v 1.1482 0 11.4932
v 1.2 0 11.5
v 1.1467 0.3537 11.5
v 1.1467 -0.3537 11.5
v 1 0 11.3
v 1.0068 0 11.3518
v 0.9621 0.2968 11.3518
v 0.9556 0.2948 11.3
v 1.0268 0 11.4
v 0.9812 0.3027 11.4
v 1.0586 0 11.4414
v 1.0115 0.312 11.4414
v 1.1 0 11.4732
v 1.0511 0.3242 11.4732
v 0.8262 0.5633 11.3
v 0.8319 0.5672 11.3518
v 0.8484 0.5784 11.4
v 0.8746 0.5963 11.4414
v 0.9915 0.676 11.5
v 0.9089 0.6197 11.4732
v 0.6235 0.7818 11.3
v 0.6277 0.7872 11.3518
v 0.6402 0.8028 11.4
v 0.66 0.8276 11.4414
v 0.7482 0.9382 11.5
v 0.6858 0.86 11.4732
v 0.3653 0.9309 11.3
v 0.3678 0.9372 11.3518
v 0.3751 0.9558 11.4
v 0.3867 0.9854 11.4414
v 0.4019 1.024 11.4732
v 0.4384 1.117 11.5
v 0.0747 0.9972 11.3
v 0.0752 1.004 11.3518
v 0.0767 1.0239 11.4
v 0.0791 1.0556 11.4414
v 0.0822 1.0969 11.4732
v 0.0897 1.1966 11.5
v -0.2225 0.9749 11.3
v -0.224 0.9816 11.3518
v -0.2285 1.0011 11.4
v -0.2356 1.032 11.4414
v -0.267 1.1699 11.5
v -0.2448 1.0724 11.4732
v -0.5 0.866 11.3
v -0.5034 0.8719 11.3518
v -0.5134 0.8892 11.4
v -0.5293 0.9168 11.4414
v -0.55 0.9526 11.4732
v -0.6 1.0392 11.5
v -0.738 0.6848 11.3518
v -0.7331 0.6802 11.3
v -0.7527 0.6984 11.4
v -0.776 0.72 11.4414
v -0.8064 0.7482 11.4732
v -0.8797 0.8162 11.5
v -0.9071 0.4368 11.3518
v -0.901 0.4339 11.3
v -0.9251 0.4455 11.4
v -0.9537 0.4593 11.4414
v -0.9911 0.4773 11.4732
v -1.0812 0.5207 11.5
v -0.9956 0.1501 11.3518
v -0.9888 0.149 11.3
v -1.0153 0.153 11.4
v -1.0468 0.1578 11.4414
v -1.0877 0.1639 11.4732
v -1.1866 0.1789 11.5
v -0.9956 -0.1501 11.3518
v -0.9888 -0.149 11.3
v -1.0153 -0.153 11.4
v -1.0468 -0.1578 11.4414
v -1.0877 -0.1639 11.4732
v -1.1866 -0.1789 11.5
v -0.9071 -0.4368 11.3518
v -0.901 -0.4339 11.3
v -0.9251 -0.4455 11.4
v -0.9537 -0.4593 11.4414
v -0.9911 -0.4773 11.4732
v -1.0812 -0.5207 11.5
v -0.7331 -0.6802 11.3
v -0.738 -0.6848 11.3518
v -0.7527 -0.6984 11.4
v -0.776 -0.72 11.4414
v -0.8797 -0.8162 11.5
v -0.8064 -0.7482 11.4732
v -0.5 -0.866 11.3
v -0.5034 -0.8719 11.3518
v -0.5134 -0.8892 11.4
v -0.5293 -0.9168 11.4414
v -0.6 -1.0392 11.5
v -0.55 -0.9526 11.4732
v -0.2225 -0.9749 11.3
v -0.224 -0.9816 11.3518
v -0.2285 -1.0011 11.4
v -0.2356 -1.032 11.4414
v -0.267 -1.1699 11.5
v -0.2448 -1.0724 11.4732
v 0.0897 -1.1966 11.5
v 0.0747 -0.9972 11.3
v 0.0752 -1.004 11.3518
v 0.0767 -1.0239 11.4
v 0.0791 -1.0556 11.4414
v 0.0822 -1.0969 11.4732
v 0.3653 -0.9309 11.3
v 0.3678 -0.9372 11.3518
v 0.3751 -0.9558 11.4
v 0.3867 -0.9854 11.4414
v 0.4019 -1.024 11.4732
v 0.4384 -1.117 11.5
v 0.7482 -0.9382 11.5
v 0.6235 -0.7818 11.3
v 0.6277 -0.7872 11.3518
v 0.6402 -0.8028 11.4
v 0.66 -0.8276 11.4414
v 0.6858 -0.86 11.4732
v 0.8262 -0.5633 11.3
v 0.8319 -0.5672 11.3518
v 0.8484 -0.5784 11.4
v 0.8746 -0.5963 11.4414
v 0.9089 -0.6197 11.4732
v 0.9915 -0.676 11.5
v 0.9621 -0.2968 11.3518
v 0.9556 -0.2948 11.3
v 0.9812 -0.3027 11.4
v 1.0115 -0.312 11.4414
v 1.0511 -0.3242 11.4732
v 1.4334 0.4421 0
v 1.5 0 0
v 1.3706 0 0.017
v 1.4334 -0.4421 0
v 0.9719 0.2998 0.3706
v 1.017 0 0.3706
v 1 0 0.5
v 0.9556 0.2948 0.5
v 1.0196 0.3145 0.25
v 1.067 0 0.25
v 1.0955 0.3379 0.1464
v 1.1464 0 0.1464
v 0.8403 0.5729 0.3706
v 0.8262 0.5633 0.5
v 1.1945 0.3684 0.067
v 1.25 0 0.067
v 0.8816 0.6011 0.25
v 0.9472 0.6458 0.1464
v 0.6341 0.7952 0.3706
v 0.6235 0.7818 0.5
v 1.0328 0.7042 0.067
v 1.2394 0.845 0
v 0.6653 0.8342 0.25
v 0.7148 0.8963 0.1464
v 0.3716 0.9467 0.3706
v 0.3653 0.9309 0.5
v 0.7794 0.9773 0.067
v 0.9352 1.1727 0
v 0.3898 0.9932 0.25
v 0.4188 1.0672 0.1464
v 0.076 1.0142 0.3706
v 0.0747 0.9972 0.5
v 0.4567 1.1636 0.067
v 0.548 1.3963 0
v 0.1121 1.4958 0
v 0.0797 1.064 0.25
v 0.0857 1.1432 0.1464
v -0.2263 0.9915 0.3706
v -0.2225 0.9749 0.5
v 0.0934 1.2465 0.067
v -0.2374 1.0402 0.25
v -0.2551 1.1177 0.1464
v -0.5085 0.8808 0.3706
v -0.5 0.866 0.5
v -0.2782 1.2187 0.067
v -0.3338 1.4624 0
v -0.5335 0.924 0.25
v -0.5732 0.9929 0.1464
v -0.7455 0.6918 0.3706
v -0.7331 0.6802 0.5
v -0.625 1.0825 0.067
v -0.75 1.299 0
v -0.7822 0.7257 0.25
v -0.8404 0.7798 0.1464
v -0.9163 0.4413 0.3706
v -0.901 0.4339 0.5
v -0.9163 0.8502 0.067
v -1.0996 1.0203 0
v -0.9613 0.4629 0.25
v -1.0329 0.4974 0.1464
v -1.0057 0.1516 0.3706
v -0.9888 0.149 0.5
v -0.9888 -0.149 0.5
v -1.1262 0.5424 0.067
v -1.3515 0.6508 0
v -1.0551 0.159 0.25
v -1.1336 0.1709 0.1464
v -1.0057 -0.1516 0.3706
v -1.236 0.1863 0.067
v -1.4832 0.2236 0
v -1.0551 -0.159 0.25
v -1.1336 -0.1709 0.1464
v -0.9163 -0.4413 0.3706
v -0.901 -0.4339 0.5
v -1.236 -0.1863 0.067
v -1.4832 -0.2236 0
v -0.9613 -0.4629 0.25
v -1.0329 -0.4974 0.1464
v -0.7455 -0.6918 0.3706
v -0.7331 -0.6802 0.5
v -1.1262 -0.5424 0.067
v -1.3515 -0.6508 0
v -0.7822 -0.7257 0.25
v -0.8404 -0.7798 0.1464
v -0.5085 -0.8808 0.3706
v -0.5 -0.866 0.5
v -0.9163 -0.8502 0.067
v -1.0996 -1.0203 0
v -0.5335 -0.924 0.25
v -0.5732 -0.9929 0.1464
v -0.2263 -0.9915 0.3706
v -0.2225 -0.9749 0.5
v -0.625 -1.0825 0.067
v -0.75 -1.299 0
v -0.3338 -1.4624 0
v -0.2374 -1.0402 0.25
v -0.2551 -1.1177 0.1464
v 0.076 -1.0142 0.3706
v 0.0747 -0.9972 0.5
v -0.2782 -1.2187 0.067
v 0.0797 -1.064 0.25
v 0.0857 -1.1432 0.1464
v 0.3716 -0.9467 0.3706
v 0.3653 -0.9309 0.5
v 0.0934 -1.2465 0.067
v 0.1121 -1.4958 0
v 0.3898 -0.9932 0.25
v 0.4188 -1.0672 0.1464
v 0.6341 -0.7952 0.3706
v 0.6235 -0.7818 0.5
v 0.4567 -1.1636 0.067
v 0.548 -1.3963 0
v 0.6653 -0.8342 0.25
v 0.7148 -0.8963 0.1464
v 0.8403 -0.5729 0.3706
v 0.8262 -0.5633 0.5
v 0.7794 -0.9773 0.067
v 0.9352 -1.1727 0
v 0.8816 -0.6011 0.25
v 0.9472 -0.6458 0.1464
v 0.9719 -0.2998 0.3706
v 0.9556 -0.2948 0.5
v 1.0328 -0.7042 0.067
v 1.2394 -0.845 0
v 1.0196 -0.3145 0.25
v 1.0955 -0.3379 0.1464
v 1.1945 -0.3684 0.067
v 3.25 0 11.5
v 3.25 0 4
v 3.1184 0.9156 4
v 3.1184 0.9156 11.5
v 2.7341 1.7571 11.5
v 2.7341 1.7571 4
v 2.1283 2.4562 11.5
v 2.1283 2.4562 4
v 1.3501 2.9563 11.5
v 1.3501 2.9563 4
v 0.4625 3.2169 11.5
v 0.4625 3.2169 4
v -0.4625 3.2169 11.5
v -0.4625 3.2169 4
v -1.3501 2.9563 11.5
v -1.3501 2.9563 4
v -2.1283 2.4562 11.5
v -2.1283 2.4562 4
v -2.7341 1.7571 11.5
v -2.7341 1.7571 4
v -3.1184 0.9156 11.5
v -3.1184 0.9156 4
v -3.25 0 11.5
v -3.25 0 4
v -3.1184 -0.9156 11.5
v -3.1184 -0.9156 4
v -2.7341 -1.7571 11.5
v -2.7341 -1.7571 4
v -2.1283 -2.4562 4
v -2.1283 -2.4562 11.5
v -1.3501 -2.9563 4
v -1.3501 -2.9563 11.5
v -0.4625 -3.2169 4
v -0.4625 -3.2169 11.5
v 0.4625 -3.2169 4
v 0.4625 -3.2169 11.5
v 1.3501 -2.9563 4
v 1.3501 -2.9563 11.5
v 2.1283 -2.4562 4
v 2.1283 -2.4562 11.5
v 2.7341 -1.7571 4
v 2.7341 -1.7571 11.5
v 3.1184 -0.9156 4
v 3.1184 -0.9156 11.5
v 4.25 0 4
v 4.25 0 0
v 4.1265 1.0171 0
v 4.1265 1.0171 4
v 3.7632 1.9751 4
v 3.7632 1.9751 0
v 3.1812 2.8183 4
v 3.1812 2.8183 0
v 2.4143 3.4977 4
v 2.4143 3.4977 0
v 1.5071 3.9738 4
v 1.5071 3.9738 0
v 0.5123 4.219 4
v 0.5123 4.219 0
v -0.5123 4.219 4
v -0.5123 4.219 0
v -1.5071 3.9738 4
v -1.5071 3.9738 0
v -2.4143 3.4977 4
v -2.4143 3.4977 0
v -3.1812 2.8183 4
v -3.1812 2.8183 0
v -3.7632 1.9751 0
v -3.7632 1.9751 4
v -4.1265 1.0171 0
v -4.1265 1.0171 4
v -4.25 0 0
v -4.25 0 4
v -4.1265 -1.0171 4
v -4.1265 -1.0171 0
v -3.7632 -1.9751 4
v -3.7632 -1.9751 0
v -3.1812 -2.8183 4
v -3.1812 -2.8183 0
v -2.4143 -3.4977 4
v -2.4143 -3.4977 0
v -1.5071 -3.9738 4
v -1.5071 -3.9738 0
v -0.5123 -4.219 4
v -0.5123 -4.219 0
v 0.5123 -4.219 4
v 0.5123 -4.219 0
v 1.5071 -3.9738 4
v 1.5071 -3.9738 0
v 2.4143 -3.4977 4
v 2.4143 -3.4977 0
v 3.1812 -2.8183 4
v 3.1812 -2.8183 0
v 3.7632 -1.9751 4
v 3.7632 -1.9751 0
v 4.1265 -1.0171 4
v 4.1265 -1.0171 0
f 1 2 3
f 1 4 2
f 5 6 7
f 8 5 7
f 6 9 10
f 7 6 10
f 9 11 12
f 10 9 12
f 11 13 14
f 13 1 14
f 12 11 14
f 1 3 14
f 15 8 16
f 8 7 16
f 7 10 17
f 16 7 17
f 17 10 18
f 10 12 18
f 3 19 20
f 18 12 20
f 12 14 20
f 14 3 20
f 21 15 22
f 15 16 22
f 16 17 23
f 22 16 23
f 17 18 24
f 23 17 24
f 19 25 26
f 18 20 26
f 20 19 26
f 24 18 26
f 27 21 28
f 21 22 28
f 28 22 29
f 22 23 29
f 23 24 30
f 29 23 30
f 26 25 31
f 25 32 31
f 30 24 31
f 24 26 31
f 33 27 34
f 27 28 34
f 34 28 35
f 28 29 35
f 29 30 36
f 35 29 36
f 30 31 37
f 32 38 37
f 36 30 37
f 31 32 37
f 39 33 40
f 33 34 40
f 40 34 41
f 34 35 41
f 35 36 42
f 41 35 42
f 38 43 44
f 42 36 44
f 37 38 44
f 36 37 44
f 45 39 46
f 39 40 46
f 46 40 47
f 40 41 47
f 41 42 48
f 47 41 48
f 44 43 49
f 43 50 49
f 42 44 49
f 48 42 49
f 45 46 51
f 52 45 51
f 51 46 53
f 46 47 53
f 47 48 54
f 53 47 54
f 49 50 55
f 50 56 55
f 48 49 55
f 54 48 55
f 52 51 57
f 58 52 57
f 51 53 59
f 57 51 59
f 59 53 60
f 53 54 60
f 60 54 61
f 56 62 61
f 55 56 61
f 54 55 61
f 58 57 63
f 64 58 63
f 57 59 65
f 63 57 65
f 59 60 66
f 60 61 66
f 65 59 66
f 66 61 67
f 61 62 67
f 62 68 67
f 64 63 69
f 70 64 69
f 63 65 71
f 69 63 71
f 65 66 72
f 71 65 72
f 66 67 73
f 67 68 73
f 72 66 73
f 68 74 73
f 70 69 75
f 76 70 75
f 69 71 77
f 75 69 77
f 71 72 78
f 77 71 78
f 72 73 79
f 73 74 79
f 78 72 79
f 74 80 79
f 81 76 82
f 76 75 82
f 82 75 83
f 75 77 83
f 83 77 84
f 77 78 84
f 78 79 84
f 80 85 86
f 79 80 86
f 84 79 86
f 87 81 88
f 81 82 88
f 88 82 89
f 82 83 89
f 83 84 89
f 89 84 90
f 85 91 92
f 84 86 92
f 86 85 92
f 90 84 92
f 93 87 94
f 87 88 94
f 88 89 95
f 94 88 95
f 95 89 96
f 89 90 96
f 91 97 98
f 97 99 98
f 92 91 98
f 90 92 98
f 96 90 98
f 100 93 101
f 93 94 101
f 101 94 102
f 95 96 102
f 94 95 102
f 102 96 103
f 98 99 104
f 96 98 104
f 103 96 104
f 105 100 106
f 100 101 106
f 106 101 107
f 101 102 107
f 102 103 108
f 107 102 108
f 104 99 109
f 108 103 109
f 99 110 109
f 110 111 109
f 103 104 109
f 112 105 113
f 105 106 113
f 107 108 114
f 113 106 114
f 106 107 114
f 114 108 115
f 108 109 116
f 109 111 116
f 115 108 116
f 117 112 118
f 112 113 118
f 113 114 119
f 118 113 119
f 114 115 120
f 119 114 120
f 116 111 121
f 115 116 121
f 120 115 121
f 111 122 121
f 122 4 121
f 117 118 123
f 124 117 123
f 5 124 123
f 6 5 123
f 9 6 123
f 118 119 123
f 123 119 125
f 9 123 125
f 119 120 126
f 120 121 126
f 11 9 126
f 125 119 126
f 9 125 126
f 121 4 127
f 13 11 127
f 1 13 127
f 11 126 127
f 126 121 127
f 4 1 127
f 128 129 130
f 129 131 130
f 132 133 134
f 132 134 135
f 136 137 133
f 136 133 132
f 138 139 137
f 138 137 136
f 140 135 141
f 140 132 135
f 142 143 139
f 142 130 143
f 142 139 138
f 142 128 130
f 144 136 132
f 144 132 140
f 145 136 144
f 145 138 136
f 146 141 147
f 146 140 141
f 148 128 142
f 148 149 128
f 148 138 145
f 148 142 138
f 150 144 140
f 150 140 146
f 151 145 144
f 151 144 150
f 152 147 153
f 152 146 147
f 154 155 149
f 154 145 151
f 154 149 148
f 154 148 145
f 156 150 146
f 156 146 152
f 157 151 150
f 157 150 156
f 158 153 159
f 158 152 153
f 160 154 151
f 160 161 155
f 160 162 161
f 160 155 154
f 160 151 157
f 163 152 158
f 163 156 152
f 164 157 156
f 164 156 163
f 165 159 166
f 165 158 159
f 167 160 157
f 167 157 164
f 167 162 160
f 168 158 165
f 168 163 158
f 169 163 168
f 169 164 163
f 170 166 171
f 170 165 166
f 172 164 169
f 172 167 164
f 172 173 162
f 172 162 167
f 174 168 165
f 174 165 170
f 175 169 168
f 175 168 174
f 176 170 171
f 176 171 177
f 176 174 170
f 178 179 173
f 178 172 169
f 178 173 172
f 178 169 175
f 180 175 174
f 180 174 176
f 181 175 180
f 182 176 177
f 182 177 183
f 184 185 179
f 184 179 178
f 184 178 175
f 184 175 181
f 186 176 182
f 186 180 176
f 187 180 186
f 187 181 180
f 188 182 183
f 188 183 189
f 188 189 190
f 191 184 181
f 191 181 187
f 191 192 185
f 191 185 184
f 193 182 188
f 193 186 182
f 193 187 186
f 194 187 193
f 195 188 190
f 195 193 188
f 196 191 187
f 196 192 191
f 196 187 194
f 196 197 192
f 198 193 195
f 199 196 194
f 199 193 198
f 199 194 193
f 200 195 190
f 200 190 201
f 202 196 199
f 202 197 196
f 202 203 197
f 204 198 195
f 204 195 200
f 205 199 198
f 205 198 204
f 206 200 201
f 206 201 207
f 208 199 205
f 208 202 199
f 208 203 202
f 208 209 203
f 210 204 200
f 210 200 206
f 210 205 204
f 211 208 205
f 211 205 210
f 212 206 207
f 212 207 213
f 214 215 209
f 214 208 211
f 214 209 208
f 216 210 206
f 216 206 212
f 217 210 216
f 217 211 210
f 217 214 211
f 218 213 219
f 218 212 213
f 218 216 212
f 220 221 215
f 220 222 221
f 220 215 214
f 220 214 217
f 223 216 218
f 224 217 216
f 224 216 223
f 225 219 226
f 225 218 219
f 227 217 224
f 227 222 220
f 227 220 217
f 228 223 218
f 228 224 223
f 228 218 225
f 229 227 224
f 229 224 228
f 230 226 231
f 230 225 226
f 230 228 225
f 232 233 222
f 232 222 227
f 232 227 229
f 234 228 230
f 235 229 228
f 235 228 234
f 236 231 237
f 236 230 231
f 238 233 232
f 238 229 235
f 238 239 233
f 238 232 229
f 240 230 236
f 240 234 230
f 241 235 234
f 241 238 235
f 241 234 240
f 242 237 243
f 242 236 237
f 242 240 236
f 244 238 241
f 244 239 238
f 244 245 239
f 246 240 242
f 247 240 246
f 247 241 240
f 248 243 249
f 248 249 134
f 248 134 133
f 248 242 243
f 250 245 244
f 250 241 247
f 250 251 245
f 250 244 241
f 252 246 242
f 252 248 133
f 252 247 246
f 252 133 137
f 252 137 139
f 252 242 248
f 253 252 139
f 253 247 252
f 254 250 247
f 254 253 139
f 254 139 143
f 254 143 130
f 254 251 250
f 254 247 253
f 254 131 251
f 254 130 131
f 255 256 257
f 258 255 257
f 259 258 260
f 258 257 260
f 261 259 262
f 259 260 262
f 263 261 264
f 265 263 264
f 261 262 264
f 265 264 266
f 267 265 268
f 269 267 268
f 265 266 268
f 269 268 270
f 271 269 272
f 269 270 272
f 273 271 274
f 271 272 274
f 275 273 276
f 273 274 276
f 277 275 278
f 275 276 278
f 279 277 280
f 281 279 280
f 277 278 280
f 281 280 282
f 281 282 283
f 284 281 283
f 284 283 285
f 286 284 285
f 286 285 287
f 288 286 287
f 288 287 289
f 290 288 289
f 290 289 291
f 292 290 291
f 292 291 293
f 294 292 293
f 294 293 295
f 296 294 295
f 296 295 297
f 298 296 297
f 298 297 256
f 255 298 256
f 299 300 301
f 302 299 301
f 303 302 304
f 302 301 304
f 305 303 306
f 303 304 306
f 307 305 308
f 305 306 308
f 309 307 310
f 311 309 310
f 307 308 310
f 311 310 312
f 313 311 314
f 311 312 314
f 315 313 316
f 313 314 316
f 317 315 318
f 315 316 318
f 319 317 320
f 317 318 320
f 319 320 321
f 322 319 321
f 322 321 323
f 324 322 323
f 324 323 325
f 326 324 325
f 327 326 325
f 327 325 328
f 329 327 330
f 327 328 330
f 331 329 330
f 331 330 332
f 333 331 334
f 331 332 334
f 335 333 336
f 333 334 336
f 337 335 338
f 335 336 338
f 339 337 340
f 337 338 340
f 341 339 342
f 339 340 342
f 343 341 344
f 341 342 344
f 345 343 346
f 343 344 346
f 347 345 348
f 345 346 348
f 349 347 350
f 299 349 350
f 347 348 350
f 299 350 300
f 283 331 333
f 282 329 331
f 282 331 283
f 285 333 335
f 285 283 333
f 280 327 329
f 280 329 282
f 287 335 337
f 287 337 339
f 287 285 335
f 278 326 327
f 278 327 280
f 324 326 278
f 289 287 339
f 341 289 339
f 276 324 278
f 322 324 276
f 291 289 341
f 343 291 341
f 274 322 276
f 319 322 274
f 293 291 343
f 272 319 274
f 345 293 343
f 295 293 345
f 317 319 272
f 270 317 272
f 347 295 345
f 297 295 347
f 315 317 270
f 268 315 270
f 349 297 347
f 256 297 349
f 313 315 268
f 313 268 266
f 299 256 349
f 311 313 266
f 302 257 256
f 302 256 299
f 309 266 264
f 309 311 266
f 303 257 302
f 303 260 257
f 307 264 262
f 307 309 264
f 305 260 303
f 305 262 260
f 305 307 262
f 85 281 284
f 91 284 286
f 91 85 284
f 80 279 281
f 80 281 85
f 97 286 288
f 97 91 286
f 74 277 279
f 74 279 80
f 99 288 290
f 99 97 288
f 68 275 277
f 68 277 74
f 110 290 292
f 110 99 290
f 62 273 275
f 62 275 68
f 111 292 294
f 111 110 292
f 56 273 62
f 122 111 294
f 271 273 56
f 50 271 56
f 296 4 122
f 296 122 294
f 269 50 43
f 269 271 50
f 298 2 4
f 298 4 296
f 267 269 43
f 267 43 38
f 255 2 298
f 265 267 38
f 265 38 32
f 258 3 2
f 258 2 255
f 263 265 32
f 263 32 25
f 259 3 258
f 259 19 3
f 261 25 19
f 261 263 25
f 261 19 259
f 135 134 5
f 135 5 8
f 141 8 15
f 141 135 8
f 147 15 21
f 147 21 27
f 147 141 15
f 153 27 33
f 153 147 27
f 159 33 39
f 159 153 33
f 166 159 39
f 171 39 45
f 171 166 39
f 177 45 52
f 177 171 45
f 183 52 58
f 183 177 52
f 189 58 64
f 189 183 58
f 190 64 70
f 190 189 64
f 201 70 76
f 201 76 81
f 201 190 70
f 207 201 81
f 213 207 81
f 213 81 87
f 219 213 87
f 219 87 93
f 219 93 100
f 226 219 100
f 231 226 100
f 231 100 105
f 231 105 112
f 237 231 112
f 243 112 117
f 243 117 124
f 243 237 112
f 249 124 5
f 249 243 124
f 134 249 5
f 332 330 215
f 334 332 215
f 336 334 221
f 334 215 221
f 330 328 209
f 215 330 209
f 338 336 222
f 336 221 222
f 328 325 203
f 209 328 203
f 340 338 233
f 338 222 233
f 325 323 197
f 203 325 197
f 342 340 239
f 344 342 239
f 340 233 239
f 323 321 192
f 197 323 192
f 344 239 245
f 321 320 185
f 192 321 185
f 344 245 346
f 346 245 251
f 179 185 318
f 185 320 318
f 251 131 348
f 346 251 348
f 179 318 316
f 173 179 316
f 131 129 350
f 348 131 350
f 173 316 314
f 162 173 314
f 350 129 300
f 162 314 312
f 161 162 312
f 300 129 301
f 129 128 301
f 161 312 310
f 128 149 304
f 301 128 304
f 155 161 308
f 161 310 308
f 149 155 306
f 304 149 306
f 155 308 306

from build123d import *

# Parameters (mm, degrees)
F0_R     = 3.25
F0_R_2   = 1
F1_DEPTH = 11.5
F0_R_3   = 4.25
F2_DEPTH = 4
F3_R     = 0.2
F4_R     = 0.5


with BuildPart() as f1:
    # F0 (on Top) → F1 (new body)
    with BuildSketch(Plane.XY):
        Circle(F0_R)
        Circle(F0_R_2, mode=Mode.SUBTRACT)
    extrude(amount=F1_DEPTH)

    # F0 (on Top) → F2 (join)
    with BuildSketch(Plane.XY):
        Circle(F0_R_3)
        Circle(F0_R, mode=Mode.SUBTRACT)
    extrude(amount=F2_DEPTH)

    # F3
    f3_edges = [f1.edges().sort_by_distance(p)[0] for p in [
        (-1, 0, 11.5),
    ]]
    fillet(f3_edges, radius=F3_R)

    # F4
    f4_edges = [f1.edges().sort_by_distance(p)[0] for p in [
        (-1, 0, 0),
    ]]
    fillet(f4_edges, radius=F4_R)


solid = f1.part
